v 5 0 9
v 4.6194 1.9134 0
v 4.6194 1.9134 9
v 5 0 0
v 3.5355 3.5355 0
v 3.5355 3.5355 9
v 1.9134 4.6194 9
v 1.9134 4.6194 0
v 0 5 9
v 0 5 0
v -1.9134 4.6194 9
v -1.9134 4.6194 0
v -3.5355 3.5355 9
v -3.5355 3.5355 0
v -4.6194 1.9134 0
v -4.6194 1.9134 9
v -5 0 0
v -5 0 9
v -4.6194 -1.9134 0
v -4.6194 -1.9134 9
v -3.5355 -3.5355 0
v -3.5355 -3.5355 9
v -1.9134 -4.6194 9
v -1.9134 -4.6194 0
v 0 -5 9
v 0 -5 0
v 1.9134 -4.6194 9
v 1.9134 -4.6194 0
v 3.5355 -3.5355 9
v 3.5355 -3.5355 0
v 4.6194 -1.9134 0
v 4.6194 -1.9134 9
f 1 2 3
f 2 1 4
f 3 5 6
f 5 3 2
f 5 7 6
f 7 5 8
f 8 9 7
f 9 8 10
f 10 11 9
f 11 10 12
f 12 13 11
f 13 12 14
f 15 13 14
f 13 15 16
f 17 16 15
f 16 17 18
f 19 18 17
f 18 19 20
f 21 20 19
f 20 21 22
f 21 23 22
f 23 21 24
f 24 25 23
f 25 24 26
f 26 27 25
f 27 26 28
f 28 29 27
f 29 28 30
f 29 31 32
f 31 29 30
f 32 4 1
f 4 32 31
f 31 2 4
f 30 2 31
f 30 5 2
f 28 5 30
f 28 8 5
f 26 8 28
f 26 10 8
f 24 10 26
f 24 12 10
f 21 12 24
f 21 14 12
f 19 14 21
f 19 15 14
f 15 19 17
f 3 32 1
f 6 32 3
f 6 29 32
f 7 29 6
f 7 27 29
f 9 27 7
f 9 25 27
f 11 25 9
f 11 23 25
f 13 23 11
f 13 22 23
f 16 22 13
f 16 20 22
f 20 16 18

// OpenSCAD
// Generated by SolidPython 1.0.1 on 2020-07-29 00:46:44


cylinder(h = 9, r1 = 5, r2 = 5);
/***********************************************
*********      SolidPython code:      **********
************************************************
 
# import packages: SolidPython
from solid import *
from solid.utils import *
from itertools import chain, combinations, permutations


class Resize:

    def __init__(self, scad_file):
        self.scad_file = scad_file
        #self.scad_file = import_scad(scad_file)
        # cone/cylinder param:
        self.r1 = 0
        self.r2 = 0
        self.h = 0
        # rectangular prism param:
        self.w = 0
        self.l = 0
        # ellipse param:
        self.r = 0

    # import OpenScad code (file name corresponds to shape)


    # classify shape + parameters
    def assign(self, param1, param2, param3):
        if self.scad_file == 'cone.scad':
            self.r1 = param1
            self.r2 = param2
            self.h = param3
        elif self.scad_file == 'cylinder.scad':
            self.r1 = param1
            self.r2 = param2
            self.h = param3
        elif self.scad_file == 'rectangularPrism.scad':
            self.h = param1
            self.l = param2
            self.w = param3
        else:
            self.r = param1
            self.h = param2

    # resize parameters
    def iterate(self):
        x = range(3, 20, 2)
        i = 1
        if self.scad_file == 'cone.scad':
            tempList = list(permutations(x, 2))
            for temp in tempList:
                param1 = temp[0]
                param2 = temp[1]
                filepath = 'produced_scad_files/' + 'cone' + str(param1) + '_' + str(param2) + '_' + '.scad'
                scad_render_to_file(cylinder(h=param1, r1=param2, r2=0), filepath)

        elif self.scad_file == 'cylinder.scad':
            tempList = list(permutations(x, 3))
            for temp in tempList:
                param1 = temp[0]
                param2 = temp[1]
                filepath = 'produced_scad_files/' + 'cylinder' + str(param1) + '_' + str(param2) + '_' + '.scad'
                scad_render_to_file(cylinder(h=param1, r1=param2, r2=param2), filepath)

        elif self.scad_file == 'rectangularPrism.scad':
            tempList = list(permutations(x, 3))
            for temp in tempList:
                param1 = temp[0]
                param2 = temp[1]
                param3 = temp[2]
                filepath = 'produced_scad_files/' + 'rectangularPrism' + str(param1) + '_' + str(param2) + '_' + str(
                    param3) + '.scad'
                scad_render_to_file(cube(size=(param1, param2, param3)), filepath)

        elif self.scad_file == 'ellipse.scad':
            tempList = list(permutations(x, 4))
            for temp in tempList:
                param1 = temp[0]
                param2 = temp[1]
                param3 = temp[2]
                param4 = temp[3]
                filepath = 'produced_scad_files/' + 'ellipse' + str(param1) + '_' + str(param2) + '_' + str(param3) + '_' + str(param4) + '.scad'
                scad_render_to_file(scale([param1, param2, param3])(sphere(r=param4)), filepath)

    def render_to_scadfile(self):
        scad_render_to_file(scad, 'example.scad') 
 
************************************************/
